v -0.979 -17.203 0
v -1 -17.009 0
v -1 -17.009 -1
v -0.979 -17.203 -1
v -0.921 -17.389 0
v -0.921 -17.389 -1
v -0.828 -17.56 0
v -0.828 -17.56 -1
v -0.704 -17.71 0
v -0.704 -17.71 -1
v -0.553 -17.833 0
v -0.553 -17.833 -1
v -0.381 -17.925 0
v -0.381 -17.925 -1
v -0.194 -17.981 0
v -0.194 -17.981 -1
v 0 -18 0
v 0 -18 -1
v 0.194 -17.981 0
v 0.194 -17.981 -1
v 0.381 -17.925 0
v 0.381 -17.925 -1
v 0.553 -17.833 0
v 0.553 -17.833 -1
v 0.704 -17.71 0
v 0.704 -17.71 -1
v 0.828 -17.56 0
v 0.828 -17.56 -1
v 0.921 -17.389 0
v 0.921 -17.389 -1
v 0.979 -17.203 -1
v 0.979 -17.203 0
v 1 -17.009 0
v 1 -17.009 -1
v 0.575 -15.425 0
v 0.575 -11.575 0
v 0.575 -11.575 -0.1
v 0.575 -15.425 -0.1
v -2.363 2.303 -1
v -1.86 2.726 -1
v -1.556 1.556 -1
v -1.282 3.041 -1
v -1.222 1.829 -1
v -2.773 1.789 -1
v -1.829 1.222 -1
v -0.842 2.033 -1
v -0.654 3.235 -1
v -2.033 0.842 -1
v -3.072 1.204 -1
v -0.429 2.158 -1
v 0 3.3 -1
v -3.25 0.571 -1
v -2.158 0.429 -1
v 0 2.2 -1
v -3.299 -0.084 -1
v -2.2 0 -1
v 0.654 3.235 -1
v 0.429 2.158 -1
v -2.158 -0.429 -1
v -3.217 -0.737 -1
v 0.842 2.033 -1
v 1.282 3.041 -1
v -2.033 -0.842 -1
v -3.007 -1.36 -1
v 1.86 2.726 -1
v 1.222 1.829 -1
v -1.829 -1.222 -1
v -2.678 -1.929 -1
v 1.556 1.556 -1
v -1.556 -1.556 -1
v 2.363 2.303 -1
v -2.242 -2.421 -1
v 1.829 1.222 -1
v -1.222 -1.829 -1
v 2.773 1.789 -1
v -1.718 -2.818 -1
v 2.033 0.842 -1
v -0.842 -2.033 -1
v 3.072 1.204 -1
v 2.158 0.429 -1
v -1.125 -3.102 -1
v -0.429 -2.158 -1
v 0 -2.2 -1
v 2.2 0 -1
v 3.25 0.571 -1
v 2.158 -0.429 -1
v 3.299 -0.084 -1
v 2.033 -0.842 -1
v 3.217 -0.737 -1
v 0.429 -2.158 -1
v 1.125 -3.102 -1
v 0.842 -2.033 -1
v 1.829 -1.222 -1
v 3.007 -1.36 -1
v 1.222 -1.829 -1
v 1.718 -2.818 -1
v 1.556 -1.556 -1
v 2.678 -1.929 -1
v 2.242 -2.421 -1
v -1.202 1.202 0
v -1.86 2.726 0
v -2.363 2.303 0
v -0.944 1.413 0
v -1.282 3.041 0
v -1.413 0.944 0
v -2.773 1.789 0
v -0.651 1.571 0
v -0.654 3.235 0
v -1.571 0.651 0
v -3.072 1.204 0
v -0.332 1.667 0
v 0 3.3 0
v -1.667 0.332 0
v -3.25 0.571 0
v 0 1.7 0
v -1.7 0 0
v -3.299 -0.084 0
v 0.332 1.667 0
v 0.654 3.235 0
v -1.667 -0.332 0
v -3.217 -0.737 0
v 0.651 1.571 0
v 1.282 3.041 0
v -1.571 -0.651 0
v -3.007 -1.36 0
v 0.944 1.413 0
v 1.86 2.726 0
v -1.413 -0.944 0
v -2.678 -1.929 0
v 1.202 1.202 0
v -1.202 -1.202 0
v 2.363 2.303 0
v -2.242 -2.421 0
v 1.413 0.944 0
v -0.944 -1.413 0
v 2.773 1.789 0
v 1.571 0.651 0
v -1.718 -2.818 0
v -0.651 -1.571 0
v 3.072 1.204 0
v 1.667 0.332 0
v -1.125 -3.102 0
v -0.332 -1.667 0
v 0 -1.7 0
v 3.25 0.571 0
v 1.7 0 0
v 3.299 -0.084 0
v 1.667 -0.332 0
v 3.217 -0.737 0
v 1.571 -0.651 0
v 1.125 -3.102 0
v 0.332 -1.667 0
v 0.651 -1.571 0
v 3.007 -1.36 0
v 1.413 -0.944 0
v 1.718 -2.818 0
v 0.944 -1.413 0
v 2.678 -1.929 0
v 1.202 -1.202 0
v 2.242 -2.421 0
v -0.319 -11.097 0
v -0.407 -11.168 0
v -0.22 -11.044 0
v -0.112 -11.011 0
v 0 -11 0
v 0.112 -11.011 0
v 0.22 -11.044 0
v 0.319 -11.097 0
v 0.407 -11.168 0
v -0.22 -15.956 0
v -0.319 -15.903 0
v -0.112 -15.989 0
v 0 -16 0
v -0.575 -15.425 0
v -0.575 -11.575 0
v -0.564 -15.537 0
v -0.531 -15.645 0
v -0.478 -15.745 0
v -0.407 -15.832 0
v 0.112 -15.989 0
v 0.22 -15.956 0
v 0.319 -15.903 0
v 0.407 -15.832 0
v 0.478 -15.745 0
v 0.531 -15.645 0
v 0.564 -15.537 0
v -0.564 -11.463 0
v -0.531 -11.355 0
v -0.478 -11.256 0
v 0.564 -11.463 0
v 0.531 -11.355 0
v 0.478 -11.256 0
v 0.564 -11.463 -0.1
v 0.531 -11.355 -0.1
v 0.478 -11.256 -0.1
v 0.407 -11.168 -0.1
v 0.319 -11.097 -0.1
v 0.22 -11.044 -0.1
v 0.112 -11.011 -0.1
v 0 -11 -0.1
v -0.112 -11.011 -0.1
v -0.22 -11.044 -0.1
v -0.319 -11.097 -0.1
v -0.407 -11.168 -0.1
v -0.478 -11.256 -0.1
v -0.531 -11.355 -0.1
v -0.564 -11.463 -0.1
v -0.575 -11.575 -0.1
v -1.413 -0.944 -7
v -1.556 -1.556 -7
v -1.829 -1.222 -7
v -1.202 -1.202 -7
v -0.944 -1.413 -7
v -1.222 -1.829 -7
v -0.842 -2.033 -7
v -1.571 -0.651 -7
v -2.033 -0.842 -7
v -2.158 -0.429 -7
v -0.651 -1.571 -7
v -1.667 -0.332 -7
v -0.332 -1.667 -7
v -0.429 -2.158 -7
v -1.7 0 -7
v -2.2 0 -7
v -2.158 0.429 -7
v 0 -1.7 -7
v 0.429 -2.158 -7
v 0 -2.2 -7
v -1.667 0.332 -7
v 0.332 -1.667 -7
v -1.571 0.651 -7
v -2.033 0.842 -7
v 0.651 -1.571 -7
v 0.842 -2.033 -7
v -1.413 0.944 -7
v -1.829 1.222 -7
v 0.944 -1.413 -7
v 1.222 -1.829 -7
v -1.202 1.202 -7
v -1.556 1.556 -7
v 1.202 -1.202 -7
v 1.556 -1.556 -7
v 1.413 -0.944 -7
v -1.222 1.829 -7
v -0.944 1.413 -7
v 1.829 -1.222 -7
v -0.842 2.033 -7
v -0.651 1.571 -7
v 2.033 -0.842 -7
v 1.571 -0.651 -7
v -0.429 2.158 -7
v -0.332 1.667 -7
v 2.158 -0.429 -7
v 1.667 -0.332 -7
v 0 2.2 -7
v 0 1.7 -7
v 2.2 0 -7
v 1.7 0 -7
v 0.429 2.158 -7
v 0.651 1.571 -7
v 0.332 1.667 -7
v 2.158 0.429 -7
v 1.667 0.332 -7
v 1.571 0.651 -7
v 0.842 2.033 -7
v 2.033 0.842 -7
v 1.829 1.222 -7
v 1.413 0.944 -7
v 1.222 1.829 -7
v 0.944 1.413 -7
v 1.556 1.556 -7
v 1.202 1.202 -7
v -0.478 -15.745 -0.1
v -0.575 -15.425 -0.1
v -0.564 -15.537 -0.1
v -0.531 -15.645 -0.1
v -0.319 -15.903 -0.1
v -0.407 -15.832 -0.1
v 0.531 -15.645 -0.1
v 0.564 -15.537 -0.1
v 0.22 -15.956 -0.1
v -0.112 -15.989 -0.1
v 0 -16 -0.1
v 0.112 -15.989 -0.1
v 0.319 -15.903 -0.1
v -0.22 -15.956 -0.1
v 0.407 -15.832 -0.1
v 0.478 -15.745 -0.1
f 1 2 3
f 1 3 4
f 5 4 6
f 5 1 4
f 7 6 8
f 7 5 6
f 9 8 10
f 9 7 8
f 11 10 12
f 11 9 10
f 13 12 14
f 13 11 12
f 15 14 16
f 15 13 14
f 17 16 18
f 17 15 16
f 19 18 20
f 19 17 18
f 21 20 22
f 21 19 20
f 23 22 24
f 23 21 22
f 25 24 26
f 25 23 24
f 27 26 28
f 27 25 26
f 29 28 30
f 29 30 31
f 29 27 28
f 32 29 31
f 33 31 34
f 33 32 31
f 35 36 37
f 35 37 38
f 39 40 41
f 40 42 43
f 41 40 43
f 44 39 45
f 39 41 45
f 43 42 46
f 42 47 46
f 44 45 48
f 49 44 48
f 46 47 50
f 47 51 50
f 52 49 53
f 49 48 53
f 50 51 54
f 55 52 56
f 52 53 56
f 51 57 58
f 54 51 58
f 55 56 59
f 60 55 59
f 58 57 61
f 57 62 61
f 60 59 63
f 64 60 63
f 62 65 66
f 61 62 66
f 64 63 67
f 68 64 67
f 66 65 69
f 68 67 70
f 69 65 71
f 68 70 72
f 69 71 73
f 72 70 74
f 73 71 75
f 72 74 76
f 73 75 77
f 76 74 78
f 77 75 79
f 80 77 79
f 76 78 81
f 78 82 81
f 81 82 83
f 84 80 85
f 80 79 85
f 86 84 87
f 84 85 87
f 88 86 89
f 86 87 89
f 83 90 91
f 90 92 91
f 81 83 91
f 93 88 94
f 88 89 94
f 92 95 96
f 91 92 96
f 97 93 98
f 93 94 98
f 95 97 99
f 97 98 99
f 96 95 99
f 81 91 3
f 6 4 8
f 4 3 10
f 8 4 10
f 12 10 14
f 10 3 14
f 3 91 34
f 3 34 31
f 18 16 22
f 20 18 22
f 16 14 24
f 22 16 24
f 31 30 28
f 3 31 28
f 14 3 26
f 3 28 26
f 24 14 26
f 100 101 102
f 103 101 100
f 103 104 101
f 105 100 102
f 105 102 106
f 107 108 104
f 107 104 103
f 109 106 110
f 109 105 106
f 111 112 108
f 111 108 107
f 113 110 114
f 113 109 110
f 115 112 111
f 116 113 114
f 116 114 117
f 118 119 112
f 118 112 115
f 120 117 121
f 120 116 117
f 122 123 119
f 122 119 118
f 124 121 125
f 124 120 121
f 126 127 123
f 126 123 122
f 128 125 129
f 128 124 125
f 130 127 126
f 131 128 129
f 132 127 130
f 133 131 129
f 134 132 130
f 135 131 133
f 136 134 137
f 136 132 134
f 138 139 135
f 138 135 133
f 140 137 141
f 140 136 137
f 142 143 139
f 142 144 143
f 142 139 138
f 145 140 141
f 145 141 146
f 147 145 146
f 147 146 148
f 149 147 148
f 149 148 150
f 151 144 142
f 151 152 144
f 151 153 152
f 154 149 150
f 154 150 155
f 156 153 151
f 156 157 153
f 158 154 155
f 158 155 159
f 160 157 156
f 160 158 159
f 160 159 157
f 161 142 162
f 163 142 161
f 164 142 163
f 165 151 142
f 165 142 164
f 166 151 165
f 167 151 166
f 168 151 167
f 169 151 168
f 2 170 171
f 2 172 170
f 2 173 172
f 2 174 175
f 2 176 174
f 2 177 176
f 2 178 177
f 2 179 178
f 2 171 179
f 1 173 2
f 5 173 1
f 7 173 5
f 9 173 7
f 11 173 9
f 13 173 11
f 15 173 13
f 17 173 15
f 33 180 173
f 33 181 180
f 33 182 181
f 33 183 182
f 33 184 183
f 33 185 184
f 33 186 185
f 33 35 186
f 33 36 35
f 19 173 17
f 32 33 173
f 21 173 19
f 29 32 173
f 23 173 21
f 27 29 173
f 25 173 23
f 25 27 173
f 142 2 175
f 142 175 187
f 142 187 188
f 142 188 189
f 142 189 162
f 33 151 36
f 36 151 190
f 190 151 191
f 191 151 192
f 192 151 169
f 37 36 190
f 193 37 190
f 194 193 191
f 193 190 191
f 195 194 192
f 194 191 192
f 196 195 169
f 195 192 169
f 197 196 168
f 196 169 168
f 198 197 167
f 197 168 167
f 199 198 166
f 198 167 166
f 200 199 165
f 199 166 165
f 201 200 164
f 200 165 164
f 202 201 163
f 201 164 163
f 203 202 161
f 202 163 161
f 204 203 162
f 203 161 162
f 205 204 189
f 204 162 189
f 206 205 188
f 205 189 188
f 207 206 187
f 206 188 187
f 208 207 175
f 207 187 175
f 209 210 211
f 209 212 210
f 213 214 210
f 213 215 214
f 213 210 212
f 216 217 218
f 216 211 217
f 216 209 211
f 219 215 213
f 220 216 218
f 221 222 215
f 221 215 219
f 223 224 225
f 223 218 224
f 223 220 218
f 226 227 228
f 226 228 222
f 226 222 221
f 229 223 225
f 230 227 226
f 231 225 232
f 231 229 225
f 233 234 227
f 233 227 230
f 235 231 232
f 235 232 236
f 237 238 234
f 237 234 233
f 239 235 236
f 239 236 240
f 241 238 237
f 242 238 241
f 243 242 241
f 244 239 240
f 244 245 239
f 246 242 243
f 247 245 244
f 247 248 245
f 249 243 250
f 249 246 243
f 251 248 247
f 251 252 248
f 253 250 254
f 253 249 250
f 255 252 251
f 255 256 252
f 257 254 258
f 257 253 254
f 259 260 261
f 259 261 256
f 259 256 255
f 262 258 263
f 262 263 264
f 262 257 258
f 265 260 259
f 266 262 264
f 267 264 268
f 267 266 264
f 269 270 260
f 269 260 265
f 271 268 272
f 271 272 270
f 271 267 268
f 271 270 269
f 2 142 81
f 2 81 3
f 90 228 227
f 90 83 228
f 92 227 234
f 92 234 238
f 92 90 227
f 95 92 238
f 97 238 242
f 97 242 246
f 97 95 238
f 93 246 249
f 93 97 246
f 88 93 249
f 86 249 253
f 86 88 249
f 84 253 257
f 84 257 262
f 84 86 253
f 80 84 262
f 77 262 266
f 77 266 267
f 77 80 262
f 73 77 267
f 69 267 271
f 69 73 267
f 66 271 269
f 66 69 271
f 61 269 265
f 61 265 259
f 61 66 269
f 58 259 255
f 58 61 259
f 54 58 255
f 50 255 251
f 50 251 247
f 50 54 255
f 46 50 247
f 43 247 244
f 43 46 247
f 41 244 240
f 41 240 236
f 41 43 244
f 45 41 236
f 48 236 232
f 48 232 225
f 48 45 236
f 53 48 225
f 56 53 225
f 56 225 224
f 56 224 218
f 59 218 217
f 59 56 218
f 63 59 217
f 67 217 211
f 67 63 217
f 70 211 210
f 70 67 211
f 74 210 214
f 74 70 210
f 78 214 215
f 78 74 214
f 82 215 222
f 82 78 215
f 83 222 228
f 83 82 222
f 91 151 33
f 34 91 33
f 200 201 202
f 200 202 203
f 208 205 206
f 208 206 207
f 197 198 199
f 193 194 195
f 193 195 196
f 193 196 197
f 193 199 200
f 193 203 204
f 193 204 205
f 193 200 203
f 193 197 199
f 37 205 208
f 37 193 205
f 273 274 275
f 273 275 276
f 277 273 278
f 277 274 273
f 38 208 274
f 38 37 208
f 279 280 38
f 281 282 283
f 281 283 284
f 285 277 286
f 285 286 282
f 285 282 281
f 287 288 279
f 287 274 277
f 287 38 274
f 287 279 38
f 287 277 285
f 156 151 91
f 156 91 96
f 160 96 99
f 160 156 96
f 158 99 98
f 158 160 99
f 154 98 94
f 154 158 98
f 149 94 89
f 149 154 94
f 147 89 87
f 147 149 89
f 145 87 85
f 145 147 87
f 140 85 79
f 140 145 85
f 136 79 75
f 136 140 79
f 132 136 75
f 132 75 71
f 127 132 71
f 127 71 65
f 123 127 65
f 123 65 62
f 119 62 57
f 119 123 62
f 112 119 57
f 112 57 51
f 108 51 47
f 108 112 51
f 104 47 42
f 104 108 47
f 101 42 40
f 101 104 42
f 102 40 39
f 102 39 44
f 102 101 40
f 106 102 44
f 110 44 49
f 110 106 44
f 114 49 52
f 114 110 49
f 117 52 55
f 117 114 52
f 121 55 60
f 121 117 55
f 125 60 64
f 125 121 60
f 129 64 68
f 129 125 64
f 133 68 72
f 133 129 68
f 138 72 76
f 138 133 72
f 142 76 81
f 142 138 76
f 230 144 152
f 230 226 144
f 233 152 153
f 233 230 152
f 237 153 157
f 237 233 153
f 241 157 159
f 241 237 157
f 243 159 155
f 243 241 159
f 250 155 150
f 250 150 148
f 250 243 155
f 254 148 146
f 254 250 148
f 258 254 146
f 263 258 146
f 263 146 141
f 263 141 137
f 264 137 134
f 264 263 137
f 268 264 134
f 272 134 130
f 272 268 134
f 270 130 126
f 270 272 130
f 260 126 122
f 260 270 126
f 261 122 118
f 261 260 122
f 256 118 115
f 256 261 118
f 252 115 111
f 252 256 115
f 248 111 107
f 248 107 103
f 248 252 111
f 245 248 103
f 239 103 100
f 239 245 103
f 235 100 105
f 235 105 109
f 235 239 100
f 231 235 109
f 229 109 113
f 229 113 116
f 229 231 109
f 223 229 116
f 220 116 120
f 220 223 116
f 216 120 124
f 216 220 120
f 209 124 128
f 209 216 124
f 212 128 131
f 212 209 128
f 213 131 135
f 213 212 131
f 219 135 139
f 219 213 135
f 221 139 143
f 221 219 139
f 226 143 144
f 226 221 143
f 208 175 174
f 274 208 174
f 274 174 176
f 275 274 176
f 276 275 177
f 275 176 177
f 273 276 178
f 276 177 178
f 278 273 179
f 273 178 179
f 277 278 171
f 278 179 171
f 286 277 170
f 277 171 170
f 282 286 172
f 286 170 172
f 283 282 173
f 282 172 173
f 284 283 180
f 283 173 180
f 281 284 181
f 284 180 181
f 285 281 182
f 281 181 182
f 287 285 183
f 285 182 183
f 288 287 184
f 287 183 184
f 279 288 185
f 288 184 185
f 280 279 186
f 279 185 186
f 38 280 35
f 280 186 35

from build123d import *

# Parameters (mm, degrees)
PAD_DEPTH    = 1
POCKET_DEPTH = 0.1


with BuildPart() as part:
    # Sketch → Revolution (revolve)
    with BuildSketch(Plane.YZ):
        Polygon((-3.3, 0), (-1.7, 0), (-1.7, -7), (-2.2, -7), (-2.2, -1), (-3.3, -1), align=None)
    revolve(axis=Axis((0, 0, 0), (0, 0, 1)))

    # Sketch001 (on Face1 of Revolution) → Pad (new body)
    with BuildSketch(Plane(origin=(0, 0, 0), x_dir=(0, -1, 0), z_dir=(0, 0, 1))):
        with BuildLine():
            Line((3.102318, 1.125), (3.102318, -1.125))
            Line((3.102318, -1.125), (17.009034, -1))
            ThreePointArc((17.009034, -1), (18.000081, 0), (17.009034, 1))
            Line((3.102318, 1.125), (17.009034, 1))
        make_face()
    extrude(amount=-PAD_DEPTH)

    # Sketch002 (on Face2 of Pad) → Pocket (cut)
    with BuildSketch(Plane(origin=(0, 0, 0), x_dir=(0, -1, 0), z_dir=(0, 0, 1))):
        with BuildLine():
            ThreePointArc((11.575081, 0.575), (11.000081, 0), (11.575081, -0.575))
            Line((11.575081, -0.575), (15.425081, -0.575))
            ThreePointArc((15.425081, -0.575), (16.000081, 0), (15.425081, 0.575))
            Line((11.575081, 0.575), (15.425081, 0.575))
        make_face()
    extrude(amount=-POCKET_DEPTH, mode=Mode.SUBTRACT)


solid = part.part
